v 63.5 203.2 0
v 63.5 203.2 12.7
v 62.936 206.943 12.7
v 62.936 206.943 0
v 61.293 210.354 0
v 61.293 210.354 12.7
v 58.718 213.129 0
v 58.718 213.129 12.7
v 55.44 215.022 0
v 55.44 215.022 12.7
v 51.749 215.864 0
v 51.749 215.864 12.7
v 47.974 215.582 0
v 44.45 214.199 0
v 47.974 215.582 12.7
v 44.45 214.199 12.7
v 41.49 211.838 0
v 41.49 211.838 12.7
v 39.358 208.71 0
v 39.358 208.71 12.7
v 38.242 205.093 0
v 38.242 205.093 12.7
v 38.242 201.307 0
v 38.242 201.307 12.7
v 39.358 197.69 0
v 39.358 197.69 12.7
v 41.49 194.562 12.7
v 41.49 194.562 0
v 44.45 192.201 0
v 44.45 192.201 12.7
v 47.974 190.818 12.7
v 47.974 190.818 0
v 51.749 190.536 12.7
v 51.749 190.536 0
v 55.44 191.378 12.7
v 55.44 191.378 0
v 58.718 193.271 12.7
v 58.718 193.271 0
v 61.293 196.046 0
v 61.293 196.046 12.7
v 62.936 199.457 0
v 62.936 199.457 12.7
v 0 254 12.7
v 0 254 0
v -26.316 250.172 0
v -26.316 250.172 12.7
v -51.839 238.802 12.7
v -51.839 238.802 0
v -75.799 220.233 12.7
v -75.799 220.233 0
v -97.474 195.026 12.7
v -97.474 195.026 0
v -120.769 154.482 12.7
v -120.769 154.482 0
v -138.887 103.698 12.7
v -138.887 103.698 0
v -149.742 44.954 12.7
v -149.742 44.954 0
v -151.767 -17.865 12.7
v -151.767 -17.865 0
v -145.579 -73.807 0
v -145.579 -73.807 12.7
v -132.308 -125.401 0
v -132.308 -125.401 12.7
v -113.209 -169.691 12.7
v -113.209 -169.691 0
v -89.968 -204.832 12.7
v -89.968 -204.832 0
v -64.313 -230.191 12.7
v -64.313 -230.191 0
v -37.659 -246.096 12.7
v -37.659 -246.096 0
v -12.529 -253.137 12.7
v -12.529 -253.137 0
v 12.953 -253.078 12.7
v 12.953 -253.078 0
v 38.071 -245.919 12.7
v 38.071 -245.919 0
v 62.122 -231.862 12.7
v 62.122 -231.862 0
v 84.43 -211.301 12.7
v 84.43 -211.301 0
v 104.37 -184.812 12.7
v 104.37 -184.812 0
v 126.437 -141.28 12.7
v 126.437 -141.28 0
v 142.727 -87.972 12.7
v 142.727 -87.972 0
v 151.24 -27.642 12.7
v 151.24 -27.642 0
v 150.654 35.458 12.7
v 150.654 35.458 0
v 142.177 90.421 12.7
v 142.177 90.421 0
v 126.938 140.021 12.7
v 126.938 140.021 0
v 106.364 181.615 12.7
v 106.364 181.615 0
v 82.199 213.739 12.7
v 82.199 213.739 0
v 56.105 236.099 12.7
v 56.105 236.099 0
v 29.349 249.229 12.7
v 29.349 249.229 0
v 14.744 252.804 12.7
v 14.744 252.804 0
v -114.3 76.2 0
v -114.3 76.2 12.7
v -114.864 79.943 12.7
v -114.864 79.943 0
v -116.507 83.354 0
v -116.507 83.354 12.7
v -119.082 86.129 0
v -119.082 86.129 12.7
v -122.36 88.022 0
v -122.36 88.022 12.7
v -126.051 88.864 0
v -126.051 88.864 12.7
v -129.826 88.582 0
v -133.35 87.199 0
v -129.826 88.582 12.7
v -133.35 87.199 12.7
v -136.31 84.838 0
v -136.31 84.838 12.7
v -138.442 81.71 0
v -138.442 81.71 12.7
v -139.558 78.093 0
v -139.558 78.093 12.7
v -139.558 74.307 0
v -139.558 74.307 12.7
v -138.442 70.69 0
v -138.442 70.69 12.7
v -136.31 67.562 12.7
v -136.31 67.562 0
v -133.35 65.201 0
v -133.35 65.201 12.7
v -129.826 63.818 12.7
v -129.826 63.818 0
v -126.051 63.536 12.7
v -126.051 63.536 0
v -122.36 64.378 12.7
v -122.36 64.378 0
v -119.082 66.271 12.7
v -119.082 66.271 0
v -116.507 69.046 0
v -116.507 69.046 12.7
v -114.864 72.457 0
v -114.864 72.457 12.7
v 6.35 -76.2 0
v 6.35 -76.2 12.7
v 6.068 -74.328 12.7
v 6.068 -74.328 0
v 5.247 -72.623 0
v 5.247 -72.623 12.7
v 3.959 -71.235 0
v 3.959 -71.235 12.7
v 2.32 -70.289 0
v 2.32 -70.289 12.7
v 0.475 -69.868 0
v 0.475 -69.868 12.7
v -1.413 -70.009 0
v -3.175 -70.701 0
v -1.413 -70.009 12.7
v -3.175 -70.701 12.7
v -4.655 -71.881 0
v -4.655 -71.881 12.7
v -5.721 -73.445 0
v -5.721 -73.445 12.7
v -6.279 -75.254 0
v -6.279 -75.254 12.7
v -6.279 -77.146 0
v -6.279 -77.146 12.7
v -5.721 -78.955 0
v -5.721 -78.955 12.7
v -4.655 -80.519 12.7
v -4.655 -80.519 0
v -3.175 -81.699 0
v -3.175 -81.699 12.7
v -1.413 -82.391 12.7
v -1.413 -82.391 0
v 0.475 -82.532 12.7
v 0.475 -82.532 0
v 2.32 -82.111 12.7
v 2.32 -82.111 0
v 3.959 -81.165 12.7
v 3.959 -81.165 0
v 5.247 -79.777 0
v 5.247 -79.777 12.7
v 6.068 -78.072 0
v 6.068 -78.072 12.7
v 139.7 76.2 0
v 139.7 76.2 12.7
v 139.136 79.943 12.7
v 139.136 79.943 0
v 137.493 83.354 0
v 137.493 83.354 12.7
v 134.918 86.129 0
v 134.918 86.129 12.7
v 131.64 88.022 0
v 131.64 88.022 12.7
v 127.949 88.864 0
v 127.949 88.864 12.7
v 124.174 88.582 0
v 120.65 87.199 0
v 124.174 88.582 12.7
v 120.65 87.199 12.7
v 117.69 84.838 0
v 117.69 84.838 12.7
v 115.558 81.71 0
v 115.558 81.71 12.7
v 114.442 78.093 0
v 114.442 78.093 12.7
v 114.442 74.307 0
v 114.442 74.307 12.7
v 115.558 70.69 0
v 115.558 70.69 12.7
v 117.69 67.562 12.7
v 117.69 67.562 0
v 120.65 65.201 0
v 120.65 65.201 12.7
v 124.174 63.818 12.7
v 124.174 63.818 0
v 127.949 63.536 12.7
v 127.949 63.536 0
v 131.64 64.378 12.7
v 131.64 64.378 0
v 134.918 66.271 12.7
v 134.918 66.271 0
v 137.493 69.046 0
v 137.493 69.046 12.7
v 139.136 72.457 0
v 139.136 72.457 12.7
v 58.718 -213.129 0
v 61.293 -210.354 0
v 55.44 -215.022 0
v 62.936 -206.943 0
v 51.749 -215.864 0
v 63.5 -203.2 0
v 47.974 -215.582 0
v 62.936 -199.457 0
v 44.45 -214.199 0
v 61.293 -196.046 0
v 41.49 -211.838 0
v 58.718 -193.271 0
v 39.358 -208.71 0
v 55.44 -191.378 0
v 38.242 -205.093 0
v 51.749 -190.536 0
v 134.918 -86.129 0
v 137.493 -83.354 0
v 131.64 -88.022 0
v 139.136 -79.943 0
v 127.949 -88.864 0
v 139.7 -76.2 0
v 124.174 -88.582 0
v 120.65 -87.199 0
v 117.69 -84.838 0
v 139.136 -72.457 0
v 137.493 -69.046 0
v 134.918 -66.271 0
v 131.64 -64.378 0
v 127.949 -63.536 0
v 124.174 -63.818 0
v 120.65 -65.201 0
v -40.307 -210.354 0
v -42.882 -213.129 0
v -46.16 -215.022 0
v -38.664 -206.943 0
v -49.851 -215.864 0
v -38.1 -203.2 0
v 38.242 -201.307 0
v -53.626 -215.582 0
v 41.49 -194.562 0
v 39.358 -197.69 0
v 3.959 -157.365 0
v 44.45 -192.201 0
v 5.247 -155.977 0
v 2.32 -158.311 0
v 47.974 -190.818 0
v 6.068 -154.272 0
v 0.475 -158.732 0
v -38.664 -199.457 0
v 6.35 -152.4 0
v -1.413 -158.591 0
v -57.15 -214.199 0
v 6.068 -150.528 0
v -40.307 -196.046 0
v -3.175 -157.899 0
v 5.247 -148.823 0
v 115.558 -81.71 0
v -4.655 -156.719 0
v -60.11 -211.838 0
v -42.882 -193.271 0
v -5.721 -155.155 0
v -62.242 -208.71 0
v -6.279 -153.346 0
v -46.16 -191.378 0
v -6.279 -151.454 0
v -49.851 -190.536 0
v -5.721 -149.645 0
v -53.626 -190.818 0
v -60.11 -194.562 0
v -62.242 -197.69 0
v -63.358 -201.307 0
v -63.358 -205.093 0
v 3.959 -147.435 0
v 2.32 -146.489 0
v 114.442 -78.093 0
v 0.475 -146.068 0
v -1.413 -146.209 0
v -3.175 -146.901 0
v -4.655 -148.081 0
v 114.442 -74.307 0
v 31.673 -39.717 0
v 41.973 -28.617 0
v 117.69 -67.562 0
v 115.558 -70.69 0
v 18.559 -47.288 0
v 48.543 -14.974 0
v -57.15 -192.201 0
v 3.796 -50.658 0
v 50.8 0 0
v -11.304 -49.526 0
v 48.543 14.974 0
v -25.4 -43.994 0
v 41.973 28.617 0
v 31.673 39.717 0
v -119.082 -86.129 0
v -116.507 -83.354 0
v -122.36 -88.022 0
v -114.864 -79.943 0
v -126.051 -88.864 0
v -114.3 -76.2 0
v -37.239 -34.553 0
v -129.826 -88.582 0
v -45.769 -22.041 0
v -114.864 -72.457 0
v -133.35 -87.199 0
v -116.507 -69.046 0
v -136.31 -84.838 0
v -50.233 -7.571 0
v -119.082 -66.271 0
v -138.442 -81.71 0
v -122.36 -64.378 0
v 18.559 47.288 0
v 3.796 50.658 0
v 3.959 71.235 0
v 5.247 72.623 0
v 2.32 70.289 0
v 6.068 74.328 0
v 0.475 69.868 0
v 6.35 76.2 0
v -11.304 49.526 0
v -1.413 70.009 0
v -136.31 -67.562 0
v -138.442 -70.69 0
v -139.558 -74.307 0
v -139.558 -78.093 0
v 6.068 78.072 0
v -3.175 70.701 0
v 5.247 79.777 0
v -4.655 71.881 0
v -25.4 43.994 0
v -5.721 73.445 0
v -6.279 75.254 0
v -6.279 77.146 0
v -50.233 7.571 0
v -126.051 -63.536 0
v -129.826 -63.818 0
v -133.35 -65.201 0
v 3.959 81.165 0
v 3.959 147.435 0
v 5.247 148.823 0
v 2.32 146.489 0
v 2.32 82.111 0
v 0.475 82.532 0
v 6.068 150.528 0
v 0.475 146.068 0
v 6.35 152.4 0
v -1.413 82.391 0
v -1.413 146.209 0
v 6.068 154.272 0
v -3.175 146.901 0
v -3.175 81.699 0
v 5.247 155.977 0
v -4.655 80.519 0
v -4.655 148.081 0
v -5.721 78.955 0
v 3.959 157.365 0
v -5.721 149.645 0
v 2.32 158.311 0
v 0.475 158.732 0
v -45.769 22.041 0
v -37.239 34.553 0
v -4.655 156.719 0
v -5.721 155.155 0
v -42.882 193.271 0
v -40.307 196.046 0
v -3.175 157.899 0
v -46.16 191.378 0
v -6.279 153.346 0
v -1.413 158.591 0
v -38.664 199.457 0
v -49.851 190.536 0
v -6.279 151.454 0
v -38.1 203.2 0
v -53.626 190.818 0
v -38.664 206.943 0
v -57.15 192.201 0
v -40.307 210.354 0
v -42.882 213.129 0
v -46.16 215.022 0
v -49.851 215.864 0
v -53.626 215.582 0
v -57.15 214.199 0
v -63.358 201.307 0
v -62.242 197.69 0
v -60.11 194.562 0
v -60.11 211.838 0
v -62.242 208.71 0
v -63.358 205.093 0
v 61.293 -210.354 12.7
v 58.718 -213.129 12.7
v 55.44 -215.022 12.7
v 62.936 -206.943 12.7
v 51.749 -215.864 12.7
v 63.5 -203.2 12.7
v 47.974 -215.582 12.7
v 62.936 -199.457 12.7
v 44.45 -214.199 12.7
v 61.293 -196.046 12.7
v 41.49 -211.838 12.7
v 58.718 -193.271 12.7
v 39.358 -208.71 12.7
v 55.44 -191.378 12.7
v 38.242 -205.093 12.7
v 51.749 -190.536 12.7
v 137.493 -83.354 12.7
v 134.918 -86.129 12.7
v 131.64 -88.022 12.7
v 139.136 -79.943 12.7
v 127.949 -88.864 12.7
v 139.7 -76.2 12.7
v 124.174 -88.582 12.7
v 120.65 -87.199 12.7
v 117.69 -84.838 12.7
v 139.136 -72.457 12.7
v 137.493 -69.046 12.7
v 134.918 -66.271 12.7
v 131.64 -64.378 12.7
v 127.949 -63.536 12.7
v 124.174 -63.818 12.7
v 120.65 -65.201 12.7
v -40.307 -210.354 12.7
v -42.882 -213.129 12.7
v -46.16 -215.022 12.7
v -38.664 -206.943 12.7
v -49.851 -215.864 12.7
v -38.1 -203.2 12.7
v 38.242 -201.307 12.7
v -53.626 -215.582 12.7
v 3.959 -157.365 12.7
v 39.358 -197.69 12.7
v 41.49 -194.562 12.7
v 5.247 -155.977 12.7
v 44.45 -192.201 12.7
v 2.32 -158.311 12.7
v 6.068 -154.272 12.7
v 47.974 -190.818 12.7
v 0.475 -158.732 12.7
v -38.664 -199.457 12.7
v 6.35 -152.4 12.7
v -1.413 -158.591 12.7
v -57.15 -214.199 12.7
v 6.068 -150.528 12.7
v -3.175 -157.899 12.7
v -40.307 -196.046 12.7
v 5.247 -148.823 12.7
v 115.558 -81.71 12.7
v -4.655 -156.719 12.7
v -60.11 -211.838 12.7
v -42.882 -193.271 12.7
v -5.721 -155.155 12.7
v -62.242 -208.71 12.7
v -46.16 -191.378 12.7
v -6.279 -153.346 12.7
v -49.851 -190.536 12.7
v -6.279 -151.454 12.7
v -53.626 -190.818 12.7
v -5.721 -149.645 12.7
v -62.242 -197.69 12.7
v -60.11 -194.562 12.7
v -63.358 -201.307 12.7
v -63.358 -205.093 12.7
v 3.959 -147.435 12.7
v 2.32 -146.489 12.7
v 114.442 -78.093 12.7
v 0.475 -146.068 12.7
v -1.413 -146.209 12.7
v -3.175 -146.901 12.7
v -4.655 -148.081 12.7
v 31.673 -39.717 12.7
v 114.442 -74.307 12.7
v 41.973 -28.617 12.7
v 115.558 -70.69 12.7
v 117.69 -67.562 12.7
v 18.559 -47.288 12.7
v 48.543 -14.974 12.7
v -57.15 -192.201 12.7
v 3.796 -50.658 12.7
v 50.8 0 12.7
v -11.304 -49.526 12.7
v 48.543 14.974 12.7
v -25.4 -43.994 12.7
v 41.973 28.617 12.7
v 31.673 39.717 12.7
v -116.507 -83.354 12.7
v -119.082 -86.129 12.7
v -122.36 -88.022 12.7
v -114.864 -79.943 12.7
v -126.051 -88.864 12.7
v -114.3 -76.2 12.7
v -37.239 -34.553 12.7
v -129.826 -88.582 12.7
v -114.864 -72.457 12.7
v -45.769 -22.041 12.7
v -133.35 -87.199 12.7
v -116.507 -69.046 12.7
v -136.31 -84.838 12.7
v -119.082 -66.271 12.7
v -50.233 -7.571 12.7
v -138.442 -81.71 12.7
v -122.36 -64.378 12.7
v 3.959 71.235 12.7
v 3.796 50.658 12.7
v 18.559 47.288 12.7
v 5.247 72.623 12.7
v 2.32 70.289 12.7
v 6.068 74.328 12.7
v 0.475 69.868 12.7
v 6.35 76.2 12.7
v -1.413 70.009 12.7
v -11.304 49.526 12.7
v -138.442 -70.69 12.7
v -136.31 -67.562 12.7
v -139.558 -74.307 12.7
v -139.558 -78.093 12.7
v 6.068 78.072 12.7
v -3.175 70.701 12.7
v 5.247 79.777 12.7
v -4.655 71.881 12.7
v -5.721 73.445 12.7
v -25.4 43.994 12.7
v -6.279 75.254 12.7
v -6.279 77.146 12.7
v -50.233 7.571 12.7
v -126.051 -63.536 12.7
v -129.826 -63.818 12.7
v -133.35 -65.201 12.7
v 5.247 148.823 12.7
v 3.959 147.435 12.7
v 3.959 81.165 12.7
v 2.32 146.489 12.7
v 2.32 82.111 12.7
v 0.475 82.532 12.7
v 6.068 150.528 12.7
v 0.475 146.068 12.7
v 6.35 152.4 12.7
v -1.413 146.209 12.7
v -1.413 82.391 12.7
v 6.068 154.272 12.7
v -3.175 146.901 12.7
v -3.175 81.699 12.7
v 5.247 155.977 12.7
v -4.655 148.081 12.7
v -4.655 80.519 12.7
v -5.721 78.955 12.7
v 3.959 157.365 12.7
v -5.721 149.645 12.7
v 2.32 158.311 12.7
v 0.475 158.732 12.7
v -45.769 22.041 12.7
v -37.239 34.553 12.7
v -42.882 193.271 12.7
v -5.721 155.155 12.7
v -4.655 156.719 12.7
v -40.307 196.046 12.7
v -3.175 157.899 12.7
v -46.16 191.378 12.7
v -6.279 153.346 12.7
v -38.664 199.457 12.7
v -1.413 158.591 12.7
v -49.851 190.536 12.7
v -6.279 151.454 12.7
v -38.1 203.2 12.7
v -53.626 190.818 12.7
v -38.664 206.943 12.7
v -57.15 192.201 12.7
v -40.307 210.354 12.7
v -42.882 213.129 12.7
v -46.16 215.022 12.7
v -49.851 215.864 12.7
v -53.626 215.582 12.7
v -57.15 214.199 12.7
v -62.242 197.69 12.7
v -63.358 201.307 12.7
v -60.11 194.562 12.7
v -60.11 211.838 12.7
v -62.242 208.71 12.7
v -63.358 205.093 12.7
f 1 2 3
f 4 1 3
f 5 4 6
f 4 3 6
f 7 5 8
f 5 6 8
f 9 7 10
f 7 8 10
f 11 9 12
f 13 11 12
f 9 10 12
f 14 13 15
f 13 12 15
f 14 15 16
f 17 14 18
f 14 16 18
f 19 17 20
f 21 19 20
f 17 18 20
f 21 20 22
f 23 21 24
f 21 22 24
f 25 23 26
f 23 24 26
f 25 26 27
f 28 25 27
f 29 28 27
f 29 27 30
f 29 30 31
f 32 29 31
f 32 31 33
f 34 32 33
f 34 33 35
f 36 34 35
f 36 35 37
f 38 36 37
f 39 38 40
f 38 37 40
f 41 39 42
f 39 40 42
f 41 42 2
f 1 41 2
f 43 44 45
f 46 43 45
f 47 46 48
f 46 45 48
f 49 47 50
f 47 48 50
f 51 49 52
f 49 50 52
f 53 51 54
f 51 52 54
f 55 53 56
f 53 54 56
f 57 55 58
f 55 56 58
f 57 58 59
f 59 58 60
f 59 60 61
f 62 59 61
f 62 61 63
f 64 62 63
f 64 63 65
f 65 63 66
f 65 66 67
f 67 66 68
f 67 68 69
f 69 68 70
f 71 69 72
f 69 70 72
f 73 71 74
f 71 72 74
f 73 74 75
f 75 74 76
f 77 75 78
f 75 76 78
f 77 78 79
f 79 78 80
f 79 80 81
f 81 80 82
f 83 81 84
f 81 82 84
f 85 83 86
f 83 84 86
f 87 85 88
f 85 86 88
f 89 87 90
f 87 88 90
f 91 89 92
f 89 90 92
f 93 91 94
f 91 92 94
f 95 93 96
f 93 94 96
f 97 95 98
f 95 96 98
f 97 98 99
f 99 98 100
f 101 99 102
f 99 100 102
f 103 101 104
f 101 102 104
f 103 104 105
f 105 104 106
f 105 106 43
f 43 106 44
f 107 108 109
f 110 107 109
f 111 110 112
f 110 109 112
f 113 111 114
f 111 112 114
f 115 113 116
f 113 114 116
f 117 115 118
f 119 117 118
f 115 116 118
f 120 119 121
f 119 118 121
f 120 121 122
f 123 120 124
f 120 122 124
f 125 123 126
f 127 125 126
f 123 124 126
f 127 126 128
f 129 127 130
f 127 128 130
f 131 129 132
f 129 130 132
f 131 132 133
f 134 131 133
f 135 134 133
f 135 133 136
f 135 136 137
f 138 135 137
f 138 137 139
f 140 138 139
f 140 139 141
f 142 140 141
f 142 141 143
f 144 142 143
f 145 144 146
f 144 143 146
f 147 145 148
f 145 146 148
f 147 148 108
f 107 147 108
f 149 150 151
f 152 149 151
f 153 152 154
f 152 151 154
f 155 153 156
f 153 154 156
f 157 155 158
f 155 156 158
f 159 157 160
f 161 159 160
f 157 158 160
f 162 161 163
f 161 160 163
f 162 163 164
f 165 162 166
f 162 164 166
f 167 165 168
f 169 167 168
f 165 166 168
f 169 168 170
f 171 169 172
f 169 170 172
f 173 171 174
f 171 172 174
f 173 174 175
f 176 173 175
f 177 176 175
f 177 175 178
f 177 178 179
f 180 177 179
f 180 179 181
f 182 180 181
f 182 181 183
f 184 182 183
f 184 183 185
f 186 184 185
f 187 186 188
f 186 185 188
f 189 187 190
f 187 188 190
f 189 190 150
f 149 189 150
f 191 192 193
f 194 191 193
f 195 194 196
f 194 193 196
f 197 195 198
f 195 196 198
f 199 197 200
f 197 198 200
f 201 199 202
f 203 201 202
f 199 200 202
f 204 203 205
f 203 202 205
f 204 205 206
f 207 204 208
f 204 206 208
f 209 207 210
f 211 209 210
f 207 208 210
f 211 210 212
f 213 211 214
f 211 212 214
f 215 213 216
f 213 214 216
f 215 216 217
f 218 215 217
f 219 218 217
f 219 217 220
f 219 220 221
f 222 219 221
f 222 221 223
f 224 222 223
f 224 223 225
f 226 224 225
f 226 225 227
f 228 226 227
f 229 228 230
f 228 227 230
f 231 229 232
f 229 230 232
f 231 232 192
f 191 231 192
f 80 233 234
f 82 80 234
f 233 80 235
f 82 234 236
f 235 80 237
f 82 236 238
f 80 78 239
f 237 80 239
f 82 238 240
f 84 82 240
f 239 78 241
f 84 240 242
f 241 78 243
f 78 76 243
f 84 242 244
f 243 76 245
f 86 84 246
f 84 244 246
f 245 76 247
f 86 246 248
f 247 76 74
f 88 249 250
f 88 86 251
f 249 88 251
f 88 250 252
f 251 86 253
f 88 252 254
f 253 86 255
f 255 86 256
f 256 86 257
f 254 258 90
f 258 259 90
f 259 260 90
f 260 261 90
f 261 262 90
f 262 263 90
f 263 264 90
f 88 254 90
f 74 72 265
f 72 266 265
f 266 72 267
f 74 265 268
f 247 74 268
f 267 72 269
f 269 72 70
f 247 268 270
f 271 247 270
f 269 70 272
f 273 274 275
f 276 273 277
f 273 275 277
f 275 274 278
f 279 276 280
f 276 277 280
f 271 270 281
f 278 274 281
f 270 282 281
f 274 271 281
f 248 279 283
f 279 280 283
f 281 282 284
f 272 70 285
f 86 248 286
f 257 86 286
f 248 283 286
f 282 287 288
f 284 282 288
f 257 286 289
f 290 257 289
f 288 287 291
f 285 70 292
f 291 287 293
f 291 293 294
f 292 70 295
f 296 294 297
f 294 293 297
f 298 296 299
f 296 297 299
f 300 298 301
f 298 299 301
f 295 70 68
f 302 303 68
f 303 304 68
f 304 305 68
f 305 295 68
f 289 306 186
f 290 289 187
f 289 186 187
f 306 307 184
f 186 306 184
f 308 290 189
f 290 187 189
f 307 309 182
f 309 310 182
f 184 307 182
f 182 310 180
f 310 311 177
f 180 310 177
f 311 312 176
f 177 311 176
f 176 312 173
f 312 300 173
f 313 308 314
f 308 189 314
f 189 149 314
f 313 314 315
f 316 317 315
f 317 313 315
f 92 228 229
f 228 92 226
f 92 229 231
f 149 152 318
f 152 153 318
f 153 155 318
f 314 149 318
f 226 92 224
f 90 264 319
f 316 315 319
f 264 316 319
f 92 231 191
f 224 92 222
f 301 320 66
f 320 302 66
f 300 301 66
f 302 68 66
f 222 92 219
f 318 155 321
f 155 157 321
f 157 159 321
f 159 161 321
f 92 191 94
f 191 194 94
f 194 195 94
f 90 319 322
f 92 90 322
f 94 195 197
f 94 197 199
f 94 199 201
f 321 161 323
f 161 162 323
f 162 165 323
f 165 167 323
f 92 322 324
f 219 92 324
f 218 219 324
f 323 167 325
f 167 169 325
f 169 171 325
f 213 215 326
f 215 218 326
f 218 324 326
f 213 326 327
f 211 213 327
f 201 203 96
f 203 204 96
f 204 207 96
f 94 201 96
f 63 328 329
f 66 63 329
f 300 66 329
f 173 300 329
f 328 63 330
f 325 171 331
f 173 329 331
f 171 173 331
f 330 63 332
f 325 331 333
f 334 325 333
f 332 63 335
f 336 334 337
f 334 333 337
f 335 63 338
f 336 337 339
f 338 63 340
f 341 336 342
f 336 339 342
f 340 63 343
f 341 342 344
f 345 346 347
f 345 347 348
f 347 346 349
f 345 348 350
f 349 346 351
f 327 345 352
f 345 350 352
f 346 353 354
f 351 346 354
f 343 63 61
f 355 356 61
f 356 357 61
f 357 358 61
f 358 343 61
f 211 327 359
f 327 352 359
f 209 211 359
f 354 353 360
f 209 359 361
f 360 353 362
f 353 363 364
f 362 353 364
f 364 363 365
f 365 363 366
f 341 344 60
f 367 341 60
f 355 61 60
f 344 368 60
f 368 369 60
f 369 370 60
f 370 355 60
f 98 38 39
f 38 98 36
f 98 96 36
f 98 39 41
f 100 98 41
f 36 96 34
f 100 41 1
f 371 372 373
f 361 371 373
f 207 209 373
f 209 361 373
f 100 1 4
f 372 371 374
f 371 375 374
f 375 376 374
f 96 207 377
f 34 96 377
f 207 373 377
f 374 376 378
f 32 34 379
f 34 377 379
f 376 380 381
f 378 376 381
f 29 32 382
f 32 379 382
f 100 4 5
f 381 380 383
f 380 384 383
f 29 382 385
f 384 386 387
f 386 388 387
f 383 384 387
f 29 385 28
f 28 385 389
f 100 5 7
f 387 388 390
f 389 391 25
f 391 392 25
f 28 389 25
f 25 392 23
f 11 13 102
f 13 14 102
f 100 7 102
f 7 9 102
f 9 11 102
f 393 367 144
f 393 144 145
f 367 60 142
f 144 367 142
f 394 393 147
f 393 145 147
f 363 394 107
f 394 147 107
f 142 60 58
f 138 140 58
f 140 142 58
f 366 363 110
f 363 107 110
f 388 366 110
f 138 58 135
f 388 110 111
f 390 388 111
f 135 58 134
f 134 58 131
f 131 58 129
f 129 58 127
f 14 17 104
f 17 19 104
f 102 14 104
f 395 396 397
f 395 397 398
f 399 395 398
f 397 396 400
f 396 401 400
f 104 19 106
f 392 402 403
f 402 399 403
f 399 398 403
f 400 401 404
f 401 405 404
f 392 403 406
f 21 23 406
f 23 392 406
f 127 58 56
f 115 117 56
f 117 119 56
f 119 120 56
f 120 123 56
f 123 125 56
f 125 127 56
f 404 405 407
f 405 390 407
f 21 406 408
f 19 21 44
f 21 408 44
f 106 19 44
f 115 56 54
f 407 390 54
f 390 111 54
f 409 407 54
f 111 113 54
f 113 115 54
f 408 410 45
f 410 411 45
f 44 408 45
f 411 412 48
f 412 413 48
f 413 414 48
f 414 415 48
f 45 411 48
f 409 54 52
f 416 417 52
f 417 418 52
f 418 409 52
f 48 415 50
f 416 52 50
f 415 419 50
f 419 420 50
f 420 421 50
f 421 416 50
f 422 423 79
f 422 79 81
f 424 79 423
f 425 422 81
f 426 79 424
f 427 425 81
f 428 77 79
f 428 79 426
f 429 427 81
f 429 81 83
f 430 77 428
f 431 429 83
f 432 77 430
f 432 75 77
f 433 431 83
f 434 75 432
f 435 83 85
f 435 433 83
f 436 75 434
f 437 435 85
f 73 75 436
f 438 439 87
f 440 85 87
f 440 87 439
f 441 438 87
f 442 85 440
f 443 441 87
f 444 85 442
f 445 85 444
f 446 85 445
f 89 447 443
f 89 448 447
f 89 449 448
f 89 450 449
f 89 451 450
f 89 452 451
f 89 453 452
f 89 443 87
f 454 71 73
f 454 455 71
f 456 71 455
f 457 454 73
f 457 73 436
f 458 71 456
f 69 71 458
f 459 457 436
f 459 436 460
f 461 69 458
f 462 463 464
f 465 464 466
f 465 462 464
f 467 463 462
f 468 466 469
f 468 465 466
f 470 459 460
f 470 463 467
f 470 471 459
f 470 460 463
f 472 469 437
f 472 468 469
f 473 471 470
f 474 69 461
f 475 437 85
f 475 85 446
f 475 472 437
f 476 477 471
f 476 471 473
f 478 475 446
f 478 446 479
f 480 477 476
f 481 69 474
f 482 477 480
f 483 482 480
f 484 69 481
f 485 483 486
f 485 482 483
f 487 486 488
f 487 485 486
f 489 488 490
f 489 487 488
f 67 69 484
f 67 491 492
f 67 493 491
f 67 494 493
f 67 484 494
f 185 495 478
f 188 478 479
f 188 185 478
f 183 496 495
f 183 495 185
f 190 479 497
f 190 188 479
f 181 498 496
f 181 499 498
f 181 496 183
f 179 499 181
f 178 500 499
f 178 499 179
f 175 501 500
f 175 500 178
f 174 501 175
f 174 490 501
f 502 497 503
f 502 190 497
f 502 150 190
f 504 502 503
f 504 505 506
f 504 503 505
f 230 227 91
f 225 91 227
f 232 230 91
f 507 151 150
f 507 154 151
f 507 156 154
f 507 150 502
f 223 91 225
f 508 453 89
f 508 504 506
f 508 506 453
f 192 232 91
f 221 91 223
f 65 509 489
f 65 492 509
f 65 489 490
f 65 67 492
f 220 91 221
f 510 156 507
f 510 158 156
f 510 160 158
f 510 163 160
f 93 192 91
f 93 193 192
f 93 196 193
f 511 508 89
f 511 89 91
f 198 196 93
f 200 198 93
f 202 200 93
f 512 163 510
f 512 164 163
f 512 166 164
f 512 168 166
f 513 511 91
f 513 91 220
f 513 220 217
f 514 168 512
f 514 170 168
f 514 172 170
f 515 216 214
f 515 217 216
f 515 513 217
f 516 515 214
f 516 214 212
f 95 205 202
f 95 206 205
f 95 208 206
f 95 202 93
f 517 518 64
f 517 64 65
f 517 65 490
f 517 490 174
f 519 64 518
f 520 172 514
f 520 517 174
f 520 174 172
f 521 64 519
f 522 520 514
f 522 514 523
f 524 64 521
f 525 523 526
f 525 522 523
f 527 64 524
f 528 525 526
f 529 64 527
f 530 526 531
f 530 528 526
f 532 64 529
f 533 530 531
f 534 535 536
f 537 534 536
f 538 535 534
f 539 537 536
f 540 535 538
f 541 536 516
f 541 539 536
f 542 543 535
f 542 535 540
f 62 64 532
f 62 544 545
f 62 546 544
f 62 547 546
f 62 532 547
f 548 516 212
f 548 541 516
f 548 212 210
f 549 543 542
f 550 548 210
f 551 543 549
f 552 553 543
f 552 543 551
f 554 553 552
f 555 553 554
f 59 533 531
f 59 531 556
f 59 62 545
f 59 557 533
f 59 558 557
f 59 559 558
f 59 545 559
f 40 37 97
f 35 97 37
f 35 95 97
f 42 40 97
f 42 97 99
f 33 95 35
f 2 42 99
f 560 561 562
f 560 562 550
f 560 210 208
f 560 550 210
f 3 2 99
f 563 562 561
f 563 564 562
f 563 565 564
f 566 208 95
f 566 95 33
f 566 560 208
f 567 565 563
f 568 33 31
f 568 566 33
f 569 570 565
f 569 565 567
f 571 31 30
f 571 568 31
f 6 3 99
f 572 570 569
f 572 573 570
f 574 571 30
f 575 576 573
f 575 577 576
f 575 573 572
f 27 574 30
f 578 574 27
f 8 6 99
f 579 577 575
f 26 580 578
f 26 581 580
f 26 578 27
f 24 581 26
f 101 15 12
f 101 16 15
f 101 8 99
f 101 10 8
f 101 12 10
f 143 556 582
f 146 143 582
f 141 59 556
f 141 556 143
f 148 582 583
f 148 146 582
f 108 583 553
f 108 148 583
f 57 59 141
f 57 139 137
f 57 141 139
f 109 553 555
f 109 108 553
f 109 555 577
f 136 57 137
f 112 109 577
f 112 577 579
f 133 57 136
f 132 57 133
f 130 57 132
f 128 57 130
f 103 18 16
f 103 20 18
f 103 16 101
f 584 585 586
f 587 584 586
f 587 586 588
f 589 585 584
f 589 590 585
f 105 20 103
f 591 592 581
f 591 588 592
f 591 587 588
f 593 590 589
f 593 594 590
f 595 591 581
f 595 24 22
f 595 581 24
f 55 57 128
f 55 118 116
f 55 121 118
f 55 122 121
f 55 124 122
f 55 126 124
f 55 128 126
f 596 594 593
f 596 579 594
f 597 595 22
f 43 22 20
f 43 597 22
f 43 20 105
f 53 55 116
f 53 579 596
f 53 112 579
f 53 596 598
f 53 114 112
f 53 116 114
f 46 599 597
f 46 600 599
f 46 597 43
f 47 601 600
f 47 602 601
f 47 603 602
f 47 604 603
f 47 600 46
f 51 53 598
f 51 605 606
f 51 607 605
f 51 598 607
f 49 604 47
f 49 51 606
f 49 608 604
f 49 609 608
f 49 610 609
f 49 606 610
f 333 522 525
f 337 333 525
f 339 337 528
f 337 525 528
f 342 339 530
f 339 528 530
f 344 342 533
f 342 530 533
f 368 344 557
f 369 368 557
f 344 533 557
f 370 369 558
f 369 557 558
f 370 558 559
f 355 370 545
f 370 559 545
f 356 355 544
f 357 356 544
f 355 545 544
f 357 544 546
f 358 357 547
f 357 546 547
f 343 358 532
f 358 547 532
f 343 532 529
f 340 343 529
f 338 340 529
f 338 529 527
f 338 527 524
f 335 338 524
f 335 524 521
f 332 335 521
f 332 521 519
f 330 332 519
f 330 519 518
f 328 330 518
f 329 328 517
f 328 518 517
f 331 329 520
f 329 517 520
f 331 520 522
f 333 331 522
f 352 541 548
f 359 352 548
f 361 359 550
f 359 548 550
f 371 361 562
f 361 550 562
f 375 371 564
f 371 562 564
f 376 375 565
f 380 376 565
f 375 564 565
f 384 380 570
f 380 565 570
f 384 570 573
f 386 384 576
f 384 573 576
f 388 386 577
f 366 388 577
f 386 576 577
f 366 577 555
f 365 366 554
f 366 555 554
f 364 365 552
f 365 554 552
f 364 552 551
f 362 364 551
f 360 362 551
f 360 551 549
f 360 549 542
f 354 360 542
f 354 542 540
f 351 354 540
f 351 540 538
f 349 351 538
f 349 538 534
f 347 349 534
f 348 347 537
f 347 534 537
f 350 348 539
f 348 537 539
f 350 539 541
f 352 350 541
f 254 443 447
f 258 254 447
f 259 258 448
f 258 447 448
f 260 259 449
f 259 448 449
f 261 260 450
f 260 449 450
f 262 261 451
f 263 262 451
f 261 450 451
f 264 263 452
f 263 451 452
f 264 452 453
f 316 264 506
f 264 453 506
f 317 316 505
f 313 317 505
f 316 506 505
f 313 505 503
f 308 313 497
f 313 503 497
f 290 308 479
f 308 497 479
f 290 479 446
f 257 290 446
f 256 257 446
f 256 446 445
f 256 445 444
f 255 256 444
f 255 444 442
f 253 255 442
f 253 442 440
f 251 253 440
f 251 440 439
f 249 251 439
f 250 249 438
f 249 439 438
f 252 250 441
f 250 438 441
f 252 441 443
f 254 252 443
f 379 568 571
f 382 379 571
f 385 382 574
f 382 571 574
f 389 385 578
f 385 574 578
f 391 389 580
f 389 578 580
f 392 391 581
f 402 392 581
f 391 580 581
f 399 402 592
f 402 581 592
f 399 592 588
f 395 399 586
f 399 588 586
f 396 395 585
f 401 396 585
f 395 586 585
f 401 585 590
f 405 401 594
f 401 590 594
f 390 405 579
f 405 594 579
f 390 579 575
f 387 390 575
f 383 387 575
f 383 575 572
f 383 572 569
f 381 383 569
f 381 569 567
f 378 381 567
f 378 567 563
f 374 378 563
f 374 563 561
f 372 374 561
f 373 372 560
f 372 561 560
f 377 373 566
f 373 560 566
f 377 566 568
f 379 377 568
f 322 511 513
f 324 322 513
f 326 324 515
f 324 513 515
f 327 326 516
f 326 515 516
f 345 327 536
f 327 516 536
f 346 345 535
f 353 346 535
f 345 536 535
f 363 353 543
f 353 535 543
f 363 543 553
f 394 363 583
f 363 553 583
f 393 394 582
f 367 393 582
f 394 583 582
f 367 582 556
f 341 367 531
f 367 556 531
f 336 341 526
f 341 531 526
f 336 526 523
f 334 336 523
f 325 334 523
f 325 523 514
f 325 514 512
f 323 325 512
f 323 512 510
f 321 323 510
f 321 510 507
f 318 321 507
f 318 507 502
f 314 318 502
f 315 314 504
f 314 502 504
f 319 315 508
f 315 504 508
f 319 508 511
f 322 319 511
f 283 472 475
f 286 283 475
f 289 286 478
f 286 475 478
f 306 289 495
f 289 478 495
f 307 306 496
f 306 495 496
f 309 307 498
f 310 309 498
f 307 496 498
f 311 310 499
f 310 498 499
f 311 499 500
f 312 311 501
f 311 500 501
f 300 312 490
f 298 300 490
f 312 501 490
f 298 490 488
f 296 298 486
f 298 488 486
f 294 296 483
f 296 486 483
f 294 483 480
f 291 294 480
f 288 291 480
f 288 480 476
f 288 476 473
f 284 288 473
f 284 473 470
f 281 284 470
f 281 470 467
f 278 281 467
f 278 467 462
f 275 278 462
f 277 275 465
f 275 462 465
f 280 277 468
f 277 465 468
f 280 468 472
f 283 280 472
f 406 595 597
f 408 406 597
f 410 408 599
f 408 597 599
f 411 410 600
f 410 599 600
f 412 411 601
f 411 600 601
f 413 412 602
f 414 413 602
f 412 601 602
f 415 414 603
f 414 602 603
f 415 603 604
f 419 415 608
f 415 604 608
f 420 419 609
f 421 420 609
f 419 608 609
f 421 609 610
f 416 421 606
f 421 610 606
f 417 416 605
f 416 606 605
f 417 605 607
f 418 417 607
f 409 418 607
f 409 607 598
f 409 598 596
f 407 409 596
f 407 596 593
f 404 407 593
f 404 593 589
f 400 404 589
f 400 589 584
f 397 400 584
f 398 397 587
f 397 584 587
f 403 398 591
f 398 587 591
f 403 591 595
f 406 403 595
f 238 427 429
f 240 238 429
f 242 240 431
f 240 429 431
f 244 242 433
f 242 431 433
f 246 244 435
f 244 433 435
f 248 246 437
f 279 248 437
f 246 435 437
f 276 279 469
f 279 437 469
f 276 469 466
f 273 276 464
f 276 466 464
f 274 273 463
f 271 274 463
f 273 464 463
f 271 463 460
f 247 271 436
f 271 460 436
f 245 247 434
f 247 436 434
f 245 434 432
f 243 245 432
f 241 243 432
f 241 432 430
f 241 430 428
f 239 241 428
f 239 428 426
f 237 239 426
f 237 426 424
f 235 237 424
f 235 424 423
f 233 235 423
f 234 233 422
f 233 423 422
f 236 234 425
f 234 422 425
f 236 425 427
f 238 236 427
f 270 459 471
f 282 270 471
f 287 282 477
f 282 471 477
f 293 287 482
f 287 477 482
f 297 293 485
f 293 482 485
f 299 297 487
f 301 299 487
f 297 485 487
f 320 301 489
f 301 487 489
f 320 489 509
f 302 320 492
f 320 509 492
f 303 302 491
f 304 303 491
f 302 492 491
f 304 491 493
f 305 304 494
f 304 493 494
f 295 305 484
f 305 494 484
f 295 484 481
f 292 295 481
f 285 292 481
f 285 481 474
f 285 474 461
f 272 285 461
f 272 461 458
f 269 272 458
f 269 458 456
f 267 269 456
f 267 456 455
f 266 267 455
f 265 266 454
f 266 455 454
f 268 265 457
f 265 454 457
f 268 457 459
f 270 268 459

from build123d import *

# Parameters (mm, degrees)
SKETCH2_RX          = 254
SKETCH2_RY          = 152.143434343
BOSS_EXTRUDE2_DEPTH = 12.7
SKETCH3_R           = 50.8
SKETCH3_R_2         = 12.7
SKETCH3_R_3         = 6.35
CUT_EXTRUDE1_DEPTH  = 12.7


with BuildPart() as part:
    # Sketch2 → Boss-Extrude2 (new body)
    with BuildSketch(Plane(origin=(0, 0, 0), x_dir=(0, 1, 0), z_dir=(0, 0, 1))):
        with Locations((0, 0)):
            Ellipse(SKETCH2_RX, SKETCH2_RY)
    extrude(amount=BOSS_EXTRUDE2_DEPTH)

    # Sketch3 → Cut-Extrude1 (cut)
    with BuildSketch(Plane.XY.offset(12.7)):
        Circle(SKETCH3_R)
        with Locations((-50.8, 203.2)):
            Circle(SKETCH3_R_2)
        with Locations((50.8, 203.2)):
            Circle(SKETCH3_R_2)
        with Locations((127, 76.2)):
            Circle(SKETCH3_R_2)
        with Locations((127, -76.2)):
            Circle(SKETCH3_R_2)
        with Locations((-50.8, -203.2)):
            Circle(SKETCH3_R_2)
        with Locations((50.8, -203.2)):
            Circle(SKETCH3_R_2)
        with Locations((-127, 76.2)):
            Circle(SKETCH3_R_2)
        with Locations((-127, -76.2)):
            Circle(SKETCH3_R_2)
        with Locations((0, 76.2)):
            Circle(SKETCH3_R_3)
        with Locations((0, -76.2)):
            Circle(SKETCH3_R_3)
        with Locations((0, 152.4)):
            Circle(SKETCH3_R_3)
        with Locations((0, -152.4)):
            Circle(SKETCH3_R_3)
    extrude(amount=-CUT_EXTRUDE1_DEPTH, mode=Mode.SUBTRACT)


solid = part.part
